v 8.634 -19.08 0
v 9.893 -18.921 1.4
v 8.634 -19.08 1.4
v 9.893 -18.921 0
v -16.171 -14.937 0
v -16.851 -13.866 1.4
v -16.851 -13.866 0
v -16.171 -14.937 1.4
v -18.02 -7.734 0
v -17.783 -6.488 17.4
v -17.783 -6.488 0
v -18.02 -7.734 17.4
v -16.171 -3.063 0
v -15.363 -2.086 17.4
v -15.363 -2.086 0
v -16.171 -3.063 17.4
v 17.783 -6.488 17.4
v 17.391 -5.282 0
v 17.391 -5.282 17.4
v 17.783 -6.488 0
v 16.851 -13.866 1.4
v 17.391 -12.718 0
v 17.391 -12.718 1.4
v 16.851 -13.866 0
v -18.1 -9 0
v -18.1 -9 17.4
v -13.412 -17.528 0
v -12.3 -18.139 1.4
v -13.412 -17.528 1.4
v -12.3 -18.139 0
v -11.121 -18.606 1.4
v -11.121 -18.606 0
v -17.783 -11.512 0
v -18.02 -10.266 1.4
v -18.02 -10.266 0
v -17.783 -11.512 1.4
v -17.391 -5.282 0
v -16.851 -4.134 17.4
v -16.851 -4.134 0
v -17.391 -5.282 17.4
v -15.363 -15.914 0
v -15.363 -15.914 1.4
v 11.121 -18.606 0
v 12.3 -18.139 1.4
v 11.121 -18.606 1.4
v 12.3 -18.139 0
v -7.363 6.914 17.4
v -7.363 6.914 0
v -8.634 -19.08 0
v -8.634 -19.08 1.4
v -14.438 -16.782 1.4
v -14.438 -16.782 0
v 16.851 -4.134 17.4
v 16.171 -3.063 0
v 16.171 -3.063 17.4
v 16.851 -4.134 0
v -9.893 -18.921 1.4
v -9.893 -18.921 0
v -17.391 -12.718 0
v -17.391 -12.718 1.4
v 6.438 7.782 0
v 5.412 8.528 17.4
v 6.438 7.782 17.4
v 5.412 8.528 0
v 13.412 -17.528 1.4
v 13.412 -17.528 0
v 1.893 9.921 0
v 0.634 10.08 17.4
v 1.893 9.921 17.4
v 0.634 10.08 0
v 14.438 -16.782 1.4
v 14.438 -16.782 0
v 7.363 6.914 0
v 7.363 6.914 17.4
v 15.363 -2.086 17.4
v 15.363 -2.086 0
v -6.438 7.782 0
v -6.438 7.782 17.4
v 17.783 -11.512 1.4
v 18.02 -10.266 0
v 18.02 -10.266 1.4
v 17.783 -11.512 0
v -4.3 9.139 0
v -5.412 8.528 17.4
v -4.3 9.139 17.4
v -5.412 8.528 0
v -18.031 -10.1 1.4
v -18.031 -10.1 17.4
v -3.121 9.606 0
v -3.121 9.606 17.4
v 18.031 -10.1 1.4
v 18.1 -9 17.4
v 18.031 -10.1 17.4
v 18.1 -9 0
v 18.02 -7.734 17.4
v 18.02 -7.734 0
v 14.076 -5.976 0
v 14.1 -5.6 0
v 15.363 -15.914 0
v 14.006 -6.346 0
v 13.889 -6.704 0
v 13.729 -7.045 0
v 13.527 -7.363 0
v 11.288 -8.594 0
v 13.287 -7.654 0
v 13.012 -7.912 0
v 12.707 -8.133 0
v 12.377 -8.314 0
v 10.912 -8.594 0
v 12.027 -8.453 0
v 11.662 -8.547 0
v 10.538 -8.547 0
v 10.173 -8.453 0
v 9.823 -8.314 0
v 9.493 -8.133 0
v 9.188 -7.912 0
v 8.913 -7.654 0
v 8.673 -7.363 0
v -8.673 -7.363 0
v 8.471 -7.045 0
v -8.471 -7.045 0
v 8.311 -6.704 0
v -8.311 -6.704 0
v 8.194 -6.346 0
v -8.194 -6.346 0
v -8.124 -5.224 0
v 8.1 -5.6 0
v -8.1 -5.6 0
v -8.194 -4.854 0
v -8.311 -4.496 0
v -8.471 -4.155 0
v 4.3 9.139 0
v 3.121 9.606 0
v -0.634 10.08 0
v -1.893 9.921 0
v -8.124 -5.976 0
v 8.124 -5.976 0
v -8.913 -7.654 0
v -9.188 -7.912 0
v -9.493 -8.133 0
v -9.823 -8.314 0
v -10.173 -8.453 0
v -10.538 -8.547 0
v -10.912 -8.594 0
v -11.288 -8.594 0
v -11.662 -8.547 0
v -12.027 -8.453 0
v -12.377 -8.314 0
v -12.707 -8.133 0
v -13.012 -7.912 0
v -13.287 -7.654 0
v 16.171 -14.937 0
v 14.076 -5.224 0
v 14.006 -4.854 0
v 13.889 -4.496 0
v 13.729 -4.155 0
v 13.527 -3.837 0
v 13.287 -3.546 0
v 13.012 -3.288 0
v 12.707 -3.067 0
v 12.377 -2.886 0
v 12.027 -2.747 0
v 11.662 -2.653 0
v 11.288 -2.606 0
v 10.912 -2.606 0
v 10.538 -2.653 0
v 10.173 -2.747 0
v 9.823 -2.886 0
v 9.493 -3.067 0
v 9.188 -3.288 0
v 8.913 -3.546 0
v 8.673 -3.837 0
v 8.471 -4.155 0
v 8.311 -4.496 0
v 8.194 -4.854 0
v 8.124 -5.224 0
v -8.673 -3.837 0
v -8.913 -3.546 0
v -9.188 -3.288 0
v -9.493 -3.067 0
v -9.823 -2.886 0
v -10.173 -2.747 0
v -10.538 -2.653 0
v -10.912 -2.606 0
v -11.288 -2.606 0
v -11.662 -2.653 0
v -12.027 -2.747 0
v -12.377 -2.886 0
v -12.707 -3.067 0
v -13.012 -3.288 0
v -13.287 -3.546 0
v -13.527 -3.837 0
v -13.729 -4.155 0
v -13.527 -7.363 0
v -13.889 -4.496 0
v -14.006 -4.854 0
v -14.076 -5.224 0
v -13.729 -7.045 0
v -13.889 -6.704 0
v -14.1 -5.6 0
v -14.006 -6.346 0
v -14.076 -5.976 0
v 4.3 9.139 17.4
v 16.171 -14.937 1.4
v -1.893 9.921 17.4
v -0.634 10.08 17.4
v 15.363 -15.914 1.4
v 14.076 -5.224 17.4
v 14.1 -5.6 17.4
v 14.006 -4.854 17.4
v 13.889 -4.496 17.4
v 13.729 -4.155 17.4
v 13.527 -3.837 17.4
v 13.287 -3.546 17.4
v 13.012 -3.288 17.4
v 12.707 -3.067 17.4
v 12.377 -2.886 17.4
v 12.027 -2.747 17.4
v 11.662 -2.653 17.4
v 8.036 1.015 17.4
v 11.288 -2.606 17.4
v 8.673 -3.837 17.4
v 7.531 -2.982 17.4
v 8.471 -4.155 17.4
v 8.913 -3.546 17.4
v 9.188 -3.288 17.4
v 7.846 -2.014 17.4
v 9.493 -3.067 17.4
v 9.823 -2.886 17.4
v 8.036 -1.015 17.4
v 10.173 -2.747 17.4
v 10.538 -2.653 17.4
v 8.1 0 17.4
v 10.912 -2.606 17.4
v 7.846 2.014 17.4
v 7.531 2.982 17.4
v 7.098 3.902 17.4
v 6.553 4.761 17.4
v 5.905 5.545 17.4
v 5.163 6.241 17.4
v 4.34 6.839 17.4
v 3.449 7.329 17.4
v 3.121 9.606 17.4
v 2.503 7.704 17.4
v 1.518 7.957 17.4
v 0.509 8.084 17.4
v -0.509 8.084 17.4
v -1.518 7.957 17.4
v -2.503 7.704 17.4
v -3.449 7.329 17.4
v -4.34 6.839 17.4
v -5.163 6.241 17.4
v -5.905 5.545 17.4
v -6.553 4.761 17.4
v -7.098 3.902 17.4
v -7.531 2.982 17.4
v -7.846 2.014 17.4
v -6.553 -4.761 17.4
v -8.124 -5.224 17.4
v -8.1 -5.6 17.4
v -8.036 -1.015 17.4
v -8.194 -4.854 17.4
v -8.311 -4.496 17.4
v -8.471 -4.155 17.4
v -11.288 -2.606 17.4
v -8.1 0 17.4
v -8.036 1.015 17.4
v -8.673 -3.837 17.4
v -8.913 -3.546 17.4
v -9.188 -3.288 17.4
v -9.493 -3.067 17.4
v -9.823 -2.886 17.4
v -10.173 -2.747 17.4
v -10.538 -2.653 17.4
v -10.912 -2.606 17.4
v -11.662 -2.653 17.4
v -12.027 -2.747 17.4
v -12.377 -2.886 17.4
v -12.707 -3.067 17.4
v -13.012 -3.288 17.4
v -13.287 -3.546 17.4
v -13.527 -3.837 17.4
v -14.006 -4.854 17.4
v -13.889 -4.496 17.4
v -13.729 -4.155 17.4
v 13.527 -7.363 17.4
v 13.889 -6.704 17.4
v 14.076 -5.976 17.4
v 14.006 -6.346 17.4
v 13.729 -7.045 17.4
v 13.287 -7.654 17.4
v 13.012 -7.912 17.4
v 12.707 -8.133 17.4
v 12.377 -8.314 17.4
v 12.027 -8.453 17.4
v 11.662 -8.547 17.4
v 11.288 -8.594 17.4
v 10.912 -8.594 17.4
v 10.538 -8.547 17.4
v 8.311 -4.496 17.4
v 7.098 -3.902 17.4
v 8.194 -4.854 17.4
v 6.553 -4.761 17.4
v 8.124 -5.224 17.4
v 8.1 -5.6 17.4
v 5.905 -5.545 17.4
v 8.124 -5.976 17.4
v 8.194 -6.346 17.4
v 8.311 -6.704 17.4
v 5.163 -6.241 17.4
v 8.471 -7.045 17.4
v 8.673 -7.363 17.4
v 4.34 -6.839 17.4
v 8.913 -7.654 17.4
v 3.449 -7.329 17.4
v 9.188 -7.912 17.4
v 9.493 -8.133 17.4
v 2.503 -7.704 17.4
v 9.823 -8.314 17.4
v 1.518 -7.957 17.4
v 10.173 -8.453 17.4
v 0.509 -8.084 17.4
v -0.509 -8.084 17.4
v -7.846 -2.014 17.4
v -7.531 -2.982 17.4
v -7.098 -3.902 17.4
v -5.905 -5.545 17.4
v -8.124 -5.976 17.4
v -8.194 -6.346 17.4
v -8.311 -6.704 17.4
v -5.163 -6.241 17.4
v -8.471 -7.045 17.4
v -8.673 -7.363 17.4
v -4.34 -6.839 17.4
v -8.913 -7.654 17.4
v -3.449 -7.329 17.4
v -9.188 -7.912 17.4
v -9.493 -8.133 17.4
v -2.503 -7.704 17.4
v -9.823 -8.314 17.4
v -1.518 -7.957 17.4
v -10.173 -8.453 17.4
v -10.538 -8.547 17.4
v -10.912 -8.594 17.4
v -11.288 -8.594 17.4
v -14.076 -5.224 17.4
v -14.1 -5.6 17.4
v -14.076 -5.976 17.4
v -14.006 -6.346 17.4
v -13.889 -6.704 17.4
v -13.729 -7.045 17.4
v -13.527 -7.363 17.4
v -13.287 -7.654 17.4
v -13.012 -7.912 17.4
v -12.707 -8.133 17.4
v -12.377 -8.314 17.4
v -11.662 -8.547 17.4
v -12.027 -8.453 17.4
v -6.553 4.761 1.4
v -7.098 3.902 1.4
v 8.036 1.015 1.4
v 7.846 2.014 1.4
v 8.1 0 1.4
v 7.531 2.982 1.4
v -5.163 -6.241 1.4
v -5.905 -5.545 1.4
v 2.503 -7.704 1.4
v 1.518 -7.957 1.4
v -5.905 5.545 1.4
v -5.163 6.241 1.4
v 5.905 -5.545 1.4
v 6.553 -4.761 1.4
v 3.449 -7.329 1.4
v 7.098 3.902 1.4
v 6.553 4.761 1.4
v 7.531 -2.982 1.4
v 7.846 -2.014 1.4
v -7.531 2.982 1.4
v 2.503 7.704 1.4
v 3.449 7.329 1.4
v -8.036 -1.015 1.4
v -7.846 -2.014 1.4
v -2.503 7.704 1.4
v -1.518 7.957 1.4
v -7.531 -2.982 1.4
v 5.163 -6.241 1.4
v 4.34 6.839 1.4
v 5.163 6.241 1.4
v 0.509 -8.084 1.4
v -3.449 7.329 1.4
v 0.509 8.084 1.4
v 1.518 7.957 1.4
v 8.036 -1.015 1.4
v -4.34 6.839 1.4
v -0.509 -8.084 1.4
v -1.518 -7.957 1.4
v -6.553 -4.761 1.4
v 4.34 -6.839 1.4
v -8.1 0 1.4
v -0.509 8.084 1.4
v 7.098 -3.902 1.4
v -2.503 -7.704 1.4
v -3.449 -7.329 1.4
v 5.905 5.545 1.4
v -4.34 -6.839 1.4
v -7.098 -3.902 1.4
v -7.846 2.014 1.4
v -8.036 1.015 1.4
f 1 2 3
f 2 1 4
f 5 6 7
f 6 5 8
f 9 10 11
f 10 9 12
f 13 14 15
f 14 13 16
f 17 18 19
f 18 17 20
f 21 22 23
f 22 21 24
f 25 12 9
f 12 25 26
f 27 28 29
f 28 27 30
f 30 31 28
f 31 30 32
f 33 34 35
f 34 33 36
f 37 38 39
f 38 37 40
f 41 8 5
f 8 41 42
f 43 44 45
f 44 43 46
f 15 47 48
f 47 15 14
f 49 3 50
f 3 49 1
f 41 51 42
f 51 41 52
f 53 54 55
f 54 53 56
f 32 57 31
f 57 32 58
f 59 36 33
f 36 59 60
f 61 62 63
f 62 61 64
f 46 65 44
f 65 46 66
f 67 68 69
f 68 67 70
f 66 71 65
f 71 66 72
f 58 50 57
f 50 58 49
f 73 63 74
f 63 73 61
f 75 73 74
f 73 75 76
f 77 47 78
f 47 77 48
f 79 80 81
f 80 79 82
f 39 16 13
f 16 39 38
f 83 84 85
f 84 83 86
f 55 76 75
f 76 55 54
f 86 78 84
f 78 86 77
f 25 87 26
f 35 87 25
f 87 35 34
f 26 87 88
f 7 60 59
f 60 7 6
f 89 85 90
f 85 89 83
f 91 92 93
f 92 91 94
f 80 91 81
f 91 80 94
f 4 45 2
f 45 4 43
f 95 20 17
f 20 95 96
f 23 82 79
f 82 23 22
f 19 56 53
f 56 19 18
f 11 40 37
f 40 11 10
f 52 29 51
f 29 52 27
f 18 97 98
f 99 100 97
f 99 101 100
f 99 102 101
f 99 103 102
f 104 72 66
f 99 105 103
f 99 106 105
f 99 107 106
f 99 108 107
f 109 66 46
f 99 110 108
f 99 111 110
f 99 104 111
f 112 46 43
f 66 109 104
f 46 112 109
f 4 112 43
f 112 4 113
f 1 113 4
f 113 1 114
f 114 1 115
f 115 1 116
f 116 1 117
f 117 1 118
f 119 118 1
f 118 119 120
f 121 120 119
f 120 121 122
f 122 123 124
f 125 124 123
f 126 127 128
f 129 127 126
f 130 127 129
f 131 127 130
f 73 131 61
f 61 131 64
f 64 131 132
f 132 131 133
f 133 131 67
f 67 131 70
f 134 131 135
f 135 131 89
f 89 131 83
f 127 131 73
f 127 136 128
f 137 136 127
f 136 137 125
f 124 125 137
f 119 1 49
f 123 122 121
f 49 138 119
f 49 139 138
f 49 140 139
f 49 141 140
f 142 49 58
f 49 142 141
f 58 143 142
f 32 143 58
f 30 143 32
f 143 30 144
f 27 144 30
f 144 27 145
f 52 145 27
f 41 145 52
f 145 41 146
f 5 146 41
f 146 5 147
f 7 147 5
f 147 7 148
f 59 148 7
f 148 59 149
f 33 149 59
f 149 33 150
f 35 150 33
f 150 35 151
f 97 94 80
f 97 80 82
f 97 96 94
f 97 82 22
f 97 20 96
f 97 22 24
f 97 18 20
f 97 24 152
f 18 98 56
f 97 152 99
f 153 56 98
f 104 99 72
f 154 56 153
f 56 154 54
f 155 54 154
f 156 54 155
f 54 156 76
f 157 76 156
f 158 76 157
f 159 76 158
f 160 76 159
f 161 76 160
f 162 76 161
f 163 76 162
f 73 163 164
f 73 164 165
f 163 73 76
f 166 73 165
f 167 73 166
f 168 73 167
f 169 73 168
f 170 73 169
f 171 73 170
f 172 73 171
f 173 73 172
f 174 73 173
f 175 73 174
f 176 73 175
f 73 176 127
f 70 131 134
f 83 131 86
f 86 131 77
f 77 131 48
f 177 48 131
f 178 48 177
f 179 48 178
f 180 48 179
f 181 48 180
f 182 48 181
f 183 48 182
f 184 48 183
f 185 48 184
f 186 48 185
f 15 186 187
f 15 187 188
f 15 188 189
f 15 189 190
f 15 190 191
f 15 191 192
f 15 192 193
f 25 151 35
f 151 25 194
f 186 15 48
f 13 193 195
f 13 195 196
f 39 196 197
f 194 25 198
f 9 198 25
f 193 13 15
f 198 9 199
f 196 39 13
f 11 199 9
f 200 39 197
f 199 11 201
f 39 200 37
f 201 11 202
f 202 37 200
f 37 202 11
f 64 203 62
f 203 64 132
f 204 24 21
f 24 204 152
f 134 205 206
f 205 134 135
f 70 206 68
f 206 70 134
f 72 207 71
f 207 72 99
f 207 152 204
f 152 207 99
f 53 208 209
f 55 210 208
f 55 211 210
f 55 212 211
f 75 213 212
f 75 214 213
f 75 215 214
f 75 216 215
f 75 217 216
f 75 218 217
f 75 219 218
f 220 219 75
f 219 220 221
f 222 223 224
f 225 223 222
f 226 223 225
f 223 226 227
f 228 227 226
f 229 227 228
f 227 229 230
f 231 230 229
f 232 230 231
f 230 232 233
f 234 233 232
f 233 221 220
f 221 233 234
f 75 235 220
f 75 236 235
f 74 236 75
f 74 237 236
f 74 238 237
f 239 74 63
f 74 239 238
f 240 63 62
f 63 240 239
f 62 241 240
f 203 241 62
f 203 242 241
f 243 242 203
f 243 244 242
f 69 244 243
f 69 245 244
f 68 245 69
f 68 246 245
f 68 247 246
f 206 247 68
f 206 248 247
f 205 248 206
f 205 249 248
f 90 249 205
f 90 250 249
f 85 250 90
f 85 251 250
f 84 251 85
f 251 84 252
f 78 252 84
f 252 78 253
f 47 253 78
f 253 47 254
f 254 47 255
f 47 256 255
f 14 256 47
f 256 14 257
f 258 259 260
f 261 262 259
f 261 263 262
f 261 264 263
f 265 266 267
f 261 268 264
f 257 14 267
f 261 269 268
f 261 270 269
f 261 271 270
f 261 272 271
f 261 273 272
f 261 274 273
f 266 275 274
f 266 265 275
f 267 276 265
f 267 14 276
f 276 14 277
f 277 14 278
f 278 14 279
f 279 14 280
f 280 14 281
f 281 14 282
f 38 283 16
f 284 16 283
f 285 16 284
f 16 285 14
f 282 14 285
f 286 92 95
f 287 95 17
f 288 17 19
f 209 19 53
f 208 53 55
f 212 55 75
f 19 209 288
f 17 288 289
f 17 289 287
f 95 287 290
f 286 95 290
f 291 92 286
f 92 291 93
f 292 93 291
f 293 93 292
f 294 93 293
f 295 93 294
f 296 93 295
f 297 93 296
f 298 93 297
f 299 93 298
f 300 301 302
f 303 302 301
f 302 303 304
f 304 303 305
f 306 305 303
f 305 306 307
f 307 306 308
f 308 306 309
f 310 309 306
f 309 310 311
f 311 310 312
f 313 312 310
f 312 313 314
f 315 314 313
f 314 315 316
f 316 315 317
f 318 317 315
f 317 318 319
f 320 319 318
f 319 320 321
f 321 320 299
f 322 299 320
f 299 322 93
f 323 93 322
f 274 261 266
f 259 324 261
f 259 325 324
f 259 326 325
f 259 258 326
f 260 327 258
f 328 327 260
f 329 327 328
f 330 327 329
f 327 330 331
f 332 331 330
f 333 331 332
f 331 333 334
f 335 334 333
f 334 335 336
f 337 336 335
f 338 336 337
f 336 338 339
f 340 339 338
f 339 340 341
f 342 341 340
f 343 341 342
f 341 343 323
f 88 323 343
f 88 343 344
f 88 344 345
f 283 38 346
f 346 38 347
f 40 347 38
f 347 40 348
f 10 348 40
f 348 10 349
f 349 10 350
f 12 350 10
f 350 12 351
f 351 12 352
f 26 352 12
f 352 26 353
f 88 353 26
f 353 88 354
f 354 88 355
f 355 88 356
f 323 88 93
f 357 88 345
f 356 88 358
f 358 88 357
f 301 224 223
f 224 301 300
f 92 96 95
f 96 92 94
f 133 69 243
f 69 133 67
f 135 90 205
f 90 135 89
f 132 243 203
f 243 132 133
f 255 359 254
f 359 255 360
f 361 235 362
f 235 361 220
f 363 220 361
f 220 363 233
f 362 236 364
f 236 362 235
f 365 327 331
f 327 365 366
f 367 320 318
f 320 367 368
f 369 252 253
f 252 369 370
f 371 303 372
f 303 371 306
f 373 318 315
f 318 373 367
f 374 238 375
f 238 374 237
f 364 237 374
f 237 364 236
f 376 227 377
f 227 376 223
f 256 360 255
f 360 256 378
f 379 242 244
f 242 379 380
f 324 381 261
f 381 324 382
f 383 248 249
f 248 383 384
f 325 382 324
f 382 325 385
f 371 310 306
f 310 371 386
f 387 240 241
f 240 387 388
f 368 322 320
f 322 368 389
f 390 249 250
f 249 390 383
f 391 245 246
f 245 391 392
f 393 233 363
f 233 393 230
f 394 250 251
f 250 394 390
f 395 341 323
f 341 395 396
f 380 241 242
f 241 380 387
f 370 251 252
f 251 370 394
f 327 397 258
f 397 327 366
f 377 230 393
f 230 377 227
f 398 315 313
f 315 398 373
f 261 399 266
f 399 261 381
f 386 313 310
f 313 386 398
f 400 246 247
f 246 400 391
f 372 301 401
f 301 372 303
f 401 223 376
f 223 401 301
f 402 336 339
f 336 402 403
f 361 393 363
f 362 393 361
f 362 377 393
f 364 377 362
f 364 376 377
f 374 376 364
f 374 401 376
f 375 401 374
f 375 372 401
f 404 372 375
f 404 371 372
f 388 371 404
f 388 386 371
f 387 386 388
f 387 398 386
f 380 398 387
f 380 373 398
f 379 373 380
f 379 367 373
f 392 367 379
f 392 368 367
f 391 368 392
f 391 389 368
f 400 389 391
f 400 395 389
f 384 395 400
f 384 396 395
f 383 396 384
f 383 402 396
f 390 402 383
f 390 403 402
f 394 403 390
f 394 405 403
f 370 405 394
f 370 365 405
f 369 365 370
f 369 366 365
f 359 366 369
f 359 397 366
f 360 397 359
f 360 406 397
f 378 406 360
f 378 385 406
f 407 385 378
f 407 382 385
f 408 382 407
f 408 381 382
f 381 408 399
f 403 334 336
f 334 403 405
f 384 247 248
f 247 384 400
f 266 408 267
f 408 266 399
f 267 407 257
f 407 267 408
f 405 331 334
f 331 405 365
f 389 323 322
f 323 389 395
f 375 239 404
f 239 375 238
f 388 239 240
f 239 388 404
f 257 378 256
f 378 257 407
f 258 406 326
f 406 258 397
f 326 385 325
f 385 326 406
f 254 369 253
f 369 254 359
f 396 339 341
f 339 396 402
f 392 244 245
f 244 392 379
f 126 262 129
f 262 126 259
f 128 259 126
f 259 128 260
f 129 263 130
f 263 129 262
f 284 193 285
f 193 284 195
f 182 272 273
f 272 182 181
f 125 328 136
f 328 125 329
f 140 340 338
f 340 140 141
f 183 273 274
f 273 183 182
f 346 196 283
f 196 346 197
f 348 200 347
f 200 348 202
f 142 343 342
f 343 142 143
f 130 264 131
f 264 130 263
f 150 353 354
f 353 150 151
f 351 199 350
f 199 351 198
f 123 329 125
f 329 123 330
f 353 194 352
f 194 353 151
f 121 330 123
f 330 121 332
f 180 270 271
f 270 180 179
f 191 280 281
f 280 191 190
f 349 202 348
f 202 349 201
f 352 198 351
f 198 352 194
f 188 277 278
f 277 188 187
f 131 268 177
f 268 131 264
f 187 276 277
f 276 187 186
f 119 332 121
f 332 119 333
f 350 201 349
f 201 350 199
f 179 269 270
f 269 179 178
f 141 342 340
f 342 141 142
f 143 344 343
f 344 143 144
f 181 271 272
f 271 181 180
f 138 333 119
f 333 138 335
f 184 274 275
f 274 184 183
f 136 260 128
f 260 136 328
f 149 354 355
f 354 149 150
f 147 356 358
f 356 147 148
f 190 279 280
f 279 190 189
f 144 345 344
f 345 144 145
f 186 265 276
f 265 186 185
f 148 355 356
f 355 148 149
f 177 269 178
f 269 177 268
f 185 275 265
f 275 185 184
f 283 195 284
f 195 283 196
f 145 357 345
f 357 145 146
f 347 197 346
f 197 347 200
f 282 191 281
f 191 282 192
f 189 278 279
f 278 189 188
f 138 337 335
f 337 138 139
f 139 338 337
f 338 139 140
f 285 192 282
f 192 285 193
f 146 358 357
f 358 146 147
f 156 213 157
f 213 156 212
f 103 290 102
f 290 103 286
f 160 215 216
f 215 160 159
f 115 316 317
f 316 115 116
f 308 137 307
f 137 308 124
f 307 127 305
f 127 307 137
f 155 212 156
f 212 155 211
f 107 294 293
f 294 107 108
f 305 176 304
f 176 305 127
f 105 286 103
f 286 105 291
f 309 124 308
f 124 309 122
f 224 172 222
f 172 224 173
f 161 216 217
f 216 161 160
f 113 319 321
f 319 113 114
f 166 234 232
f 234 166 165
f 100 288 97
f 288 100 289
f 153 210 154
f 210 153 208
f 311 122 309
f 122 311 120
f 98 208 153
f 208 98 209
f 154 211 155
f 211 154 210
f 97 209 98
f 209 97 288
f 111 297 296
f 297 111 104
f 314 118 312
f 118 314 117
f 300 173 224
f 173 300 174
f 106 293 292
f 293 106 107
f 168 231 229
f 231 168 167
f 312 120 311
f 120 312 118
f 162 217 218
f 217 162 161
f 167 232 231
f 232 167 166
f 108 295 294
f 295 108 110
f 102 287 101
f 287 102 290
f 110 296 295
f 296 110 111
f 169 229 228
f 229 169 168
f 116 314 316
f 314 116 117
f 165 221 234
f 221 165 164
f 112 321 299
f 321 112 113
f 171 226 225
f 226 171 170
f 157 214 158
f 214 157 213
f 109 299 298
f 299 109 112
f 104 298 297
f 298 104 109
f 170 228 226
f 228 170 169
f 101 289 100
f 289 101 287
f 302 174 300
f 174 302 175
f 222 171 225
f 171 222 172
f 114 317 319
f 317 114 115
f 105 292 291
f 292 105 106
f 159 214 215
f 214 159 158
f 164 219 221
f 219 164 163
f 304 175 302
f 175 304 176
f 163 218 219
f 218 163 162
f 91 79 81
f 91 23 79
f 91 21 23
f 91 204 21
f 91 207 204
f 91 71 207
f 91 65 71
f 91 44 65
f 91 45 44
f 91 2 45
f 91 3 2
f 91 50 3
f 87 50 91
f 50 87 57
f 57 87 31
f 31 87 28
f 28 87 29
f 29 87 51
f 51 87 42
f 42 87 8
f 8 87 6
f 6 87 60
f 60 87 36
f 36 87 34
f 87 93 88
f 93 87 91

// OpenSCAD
/* [Base] */
// Select part for display, change settings for each part below
part = "Connector"; // [Connector, BatteryTray, SurfaceMount]

// Diameter of your base dowel
holeCenter = 16.2; // [10:0.1:50]
// Thickness of the wall around the dowel
wallThickness = 2; // [0.8:0.1:10]
// Thickness of the top and bottom shells
bottom = 1.4; // [0.5:0.1:10]

/* [Connector] */
// Height should be a little bit less than the diameter of what you are using for the hoop
height = 16; // [5:1:100]
// Hole diameter for zip tie
holeZip = 6; // [0:1:10]

/* [Battery Tray] */
// Length of th battery tray
batteryLength = 15; // [2:1:100]
// Width of the battery tray
batteryWidth = 35; // [10:1:100]
// Width of Zip tie
widthZip = 4; // [0:1:10]
// Roundness of corners
roundness = 2; // [0:1:2]

/* [Surface mount] */
flapWidth = 15; // [5:1:100]
mountHeight  = 10; // [5:1:100]

/* [Hidden] */
connectorHeight = mountHeight;
tapeWidth = flapWidth;
hole = holeCenter;
zip = holeZip;
walls = wallThickness;
$fn = 50;
holeRadius = hole / 2;
zipRadius = zip / 2;
xOffset = 8;
yOffset = 9;

totalHeight = height + bottom;
batteryHeight = bottom * 2 + zip;
batteryWidthOuter = batteryWidth + bottom * 2;

if(part == "Connector") gate();
if(part == "BatteryTray") rotate([0, 0, 180]) battery();
if(part == "SurfaceMount") connector();

module connector() {
    group() {
        hull() {
            cylinder(r = holeRadius + walls, h = bottom);

            translate([tapeWidth + holeRadius + walls - 1, 0, bottom / 2])
                cube([1, 5, bottom], center = true);
            
            translate([-tapeWidth - holeRadius - walls + 1, 0, bottom / 2])
                cube([1, 5, bottom], center = true);
        }

        difference() {
            cylinder(r = holeRadius + walls, h = bottom + connectorHeight);

            translate([0, 0, bottom])
                cylinder(r = holeRadius, h = bottom + connectorHeight);
        }

        translate([tapeWidth + holeRadius + walls, 0, bottom])
            cube([bottom, 5, bottom * 2], center = true);

        translate([-tapeWidth - holeRadius - walls  , 0, bottom])
            cube([bottom, 5, bottom * 2], center = true);
    }
}

module battery() {
    difference(){
        difference() {
            hull() {
                cylinder(r = holeRadius + walls, h = batteryHeight);
                
                translate([-batteryWidthOuter / 2, holeRadius + walls, 0])
                    cube([batteryWidthOuter, batteryLength, batteryHeight / 2]);
                
                
                translate([-batteryWidthOuter / 2, holeRadius + walls + batteryLength - roundness, bottom * 2 + zip -  roundness])
                    rotate([0, 90, 0])
                        cylinder(r=roundness, h = batteryWidthOuter);
                
                translate([-batteryWidthOuter / 2, holeRadius + walls, batteryHeight / 2])
                        cube([batteryWidthOuter, batteryLength - roundness, batteryHeight / 2]);
            }
            
            translate([0, 0, -1])
                cylinder(r = holeRadius, h = totalHeight + 2);
            
            translate([-batteryWidthOuter / 2 + bottom, holeRadius + walls, bottom])
                    cube([batteryWidth, batteryLength + 1, batteryHeight]);
        }
    
         translate([0, 0, bottom]) {
             difference() {          
                 translate([0, -holeRadius + walls + 1, 0])
                    cylinder(r = holeRadius * 2, h = zip);

                 translate([0, -holeRadius + walls + 1, 0])
                    cylinder(r = holeRadius * 2 - widthZip, h = zip); 
            }
        }
    }
}

module gate() {
    difference() {
        hull() {
            cylinder(r = holeRadius + walls, h = totalHeight);

            translate([-xOffset, -yOffset, 0])
                cylinder(r = holeRadius + walls, h = totalHeight);
                
            translate([xOffset, -yOffset, 0])
                cylinder(r = holeRadius + walls, h = totalHeight);  
        }
        
        translate([0, 0, bottom])
            cylinder(r = holeRadius, h = totalHeight + 2);
        
        translate([-zipRadius - holeRadius, -holeRadius  + zip / 2 - 0.5, -1])
            cylinder(r = zipRadius, h = totalHeight + 2);

        translate([holeRadius + zipRadius, -holeRadius  + zip / 2 - 0.5, -1])
            cylinder(r = zipRadius, h = totalHeight + 2);
        
        translate([-50, -100 - holeRadius - walls, bottom])
            cube([100, 100, totalHeight]);
    }
}
